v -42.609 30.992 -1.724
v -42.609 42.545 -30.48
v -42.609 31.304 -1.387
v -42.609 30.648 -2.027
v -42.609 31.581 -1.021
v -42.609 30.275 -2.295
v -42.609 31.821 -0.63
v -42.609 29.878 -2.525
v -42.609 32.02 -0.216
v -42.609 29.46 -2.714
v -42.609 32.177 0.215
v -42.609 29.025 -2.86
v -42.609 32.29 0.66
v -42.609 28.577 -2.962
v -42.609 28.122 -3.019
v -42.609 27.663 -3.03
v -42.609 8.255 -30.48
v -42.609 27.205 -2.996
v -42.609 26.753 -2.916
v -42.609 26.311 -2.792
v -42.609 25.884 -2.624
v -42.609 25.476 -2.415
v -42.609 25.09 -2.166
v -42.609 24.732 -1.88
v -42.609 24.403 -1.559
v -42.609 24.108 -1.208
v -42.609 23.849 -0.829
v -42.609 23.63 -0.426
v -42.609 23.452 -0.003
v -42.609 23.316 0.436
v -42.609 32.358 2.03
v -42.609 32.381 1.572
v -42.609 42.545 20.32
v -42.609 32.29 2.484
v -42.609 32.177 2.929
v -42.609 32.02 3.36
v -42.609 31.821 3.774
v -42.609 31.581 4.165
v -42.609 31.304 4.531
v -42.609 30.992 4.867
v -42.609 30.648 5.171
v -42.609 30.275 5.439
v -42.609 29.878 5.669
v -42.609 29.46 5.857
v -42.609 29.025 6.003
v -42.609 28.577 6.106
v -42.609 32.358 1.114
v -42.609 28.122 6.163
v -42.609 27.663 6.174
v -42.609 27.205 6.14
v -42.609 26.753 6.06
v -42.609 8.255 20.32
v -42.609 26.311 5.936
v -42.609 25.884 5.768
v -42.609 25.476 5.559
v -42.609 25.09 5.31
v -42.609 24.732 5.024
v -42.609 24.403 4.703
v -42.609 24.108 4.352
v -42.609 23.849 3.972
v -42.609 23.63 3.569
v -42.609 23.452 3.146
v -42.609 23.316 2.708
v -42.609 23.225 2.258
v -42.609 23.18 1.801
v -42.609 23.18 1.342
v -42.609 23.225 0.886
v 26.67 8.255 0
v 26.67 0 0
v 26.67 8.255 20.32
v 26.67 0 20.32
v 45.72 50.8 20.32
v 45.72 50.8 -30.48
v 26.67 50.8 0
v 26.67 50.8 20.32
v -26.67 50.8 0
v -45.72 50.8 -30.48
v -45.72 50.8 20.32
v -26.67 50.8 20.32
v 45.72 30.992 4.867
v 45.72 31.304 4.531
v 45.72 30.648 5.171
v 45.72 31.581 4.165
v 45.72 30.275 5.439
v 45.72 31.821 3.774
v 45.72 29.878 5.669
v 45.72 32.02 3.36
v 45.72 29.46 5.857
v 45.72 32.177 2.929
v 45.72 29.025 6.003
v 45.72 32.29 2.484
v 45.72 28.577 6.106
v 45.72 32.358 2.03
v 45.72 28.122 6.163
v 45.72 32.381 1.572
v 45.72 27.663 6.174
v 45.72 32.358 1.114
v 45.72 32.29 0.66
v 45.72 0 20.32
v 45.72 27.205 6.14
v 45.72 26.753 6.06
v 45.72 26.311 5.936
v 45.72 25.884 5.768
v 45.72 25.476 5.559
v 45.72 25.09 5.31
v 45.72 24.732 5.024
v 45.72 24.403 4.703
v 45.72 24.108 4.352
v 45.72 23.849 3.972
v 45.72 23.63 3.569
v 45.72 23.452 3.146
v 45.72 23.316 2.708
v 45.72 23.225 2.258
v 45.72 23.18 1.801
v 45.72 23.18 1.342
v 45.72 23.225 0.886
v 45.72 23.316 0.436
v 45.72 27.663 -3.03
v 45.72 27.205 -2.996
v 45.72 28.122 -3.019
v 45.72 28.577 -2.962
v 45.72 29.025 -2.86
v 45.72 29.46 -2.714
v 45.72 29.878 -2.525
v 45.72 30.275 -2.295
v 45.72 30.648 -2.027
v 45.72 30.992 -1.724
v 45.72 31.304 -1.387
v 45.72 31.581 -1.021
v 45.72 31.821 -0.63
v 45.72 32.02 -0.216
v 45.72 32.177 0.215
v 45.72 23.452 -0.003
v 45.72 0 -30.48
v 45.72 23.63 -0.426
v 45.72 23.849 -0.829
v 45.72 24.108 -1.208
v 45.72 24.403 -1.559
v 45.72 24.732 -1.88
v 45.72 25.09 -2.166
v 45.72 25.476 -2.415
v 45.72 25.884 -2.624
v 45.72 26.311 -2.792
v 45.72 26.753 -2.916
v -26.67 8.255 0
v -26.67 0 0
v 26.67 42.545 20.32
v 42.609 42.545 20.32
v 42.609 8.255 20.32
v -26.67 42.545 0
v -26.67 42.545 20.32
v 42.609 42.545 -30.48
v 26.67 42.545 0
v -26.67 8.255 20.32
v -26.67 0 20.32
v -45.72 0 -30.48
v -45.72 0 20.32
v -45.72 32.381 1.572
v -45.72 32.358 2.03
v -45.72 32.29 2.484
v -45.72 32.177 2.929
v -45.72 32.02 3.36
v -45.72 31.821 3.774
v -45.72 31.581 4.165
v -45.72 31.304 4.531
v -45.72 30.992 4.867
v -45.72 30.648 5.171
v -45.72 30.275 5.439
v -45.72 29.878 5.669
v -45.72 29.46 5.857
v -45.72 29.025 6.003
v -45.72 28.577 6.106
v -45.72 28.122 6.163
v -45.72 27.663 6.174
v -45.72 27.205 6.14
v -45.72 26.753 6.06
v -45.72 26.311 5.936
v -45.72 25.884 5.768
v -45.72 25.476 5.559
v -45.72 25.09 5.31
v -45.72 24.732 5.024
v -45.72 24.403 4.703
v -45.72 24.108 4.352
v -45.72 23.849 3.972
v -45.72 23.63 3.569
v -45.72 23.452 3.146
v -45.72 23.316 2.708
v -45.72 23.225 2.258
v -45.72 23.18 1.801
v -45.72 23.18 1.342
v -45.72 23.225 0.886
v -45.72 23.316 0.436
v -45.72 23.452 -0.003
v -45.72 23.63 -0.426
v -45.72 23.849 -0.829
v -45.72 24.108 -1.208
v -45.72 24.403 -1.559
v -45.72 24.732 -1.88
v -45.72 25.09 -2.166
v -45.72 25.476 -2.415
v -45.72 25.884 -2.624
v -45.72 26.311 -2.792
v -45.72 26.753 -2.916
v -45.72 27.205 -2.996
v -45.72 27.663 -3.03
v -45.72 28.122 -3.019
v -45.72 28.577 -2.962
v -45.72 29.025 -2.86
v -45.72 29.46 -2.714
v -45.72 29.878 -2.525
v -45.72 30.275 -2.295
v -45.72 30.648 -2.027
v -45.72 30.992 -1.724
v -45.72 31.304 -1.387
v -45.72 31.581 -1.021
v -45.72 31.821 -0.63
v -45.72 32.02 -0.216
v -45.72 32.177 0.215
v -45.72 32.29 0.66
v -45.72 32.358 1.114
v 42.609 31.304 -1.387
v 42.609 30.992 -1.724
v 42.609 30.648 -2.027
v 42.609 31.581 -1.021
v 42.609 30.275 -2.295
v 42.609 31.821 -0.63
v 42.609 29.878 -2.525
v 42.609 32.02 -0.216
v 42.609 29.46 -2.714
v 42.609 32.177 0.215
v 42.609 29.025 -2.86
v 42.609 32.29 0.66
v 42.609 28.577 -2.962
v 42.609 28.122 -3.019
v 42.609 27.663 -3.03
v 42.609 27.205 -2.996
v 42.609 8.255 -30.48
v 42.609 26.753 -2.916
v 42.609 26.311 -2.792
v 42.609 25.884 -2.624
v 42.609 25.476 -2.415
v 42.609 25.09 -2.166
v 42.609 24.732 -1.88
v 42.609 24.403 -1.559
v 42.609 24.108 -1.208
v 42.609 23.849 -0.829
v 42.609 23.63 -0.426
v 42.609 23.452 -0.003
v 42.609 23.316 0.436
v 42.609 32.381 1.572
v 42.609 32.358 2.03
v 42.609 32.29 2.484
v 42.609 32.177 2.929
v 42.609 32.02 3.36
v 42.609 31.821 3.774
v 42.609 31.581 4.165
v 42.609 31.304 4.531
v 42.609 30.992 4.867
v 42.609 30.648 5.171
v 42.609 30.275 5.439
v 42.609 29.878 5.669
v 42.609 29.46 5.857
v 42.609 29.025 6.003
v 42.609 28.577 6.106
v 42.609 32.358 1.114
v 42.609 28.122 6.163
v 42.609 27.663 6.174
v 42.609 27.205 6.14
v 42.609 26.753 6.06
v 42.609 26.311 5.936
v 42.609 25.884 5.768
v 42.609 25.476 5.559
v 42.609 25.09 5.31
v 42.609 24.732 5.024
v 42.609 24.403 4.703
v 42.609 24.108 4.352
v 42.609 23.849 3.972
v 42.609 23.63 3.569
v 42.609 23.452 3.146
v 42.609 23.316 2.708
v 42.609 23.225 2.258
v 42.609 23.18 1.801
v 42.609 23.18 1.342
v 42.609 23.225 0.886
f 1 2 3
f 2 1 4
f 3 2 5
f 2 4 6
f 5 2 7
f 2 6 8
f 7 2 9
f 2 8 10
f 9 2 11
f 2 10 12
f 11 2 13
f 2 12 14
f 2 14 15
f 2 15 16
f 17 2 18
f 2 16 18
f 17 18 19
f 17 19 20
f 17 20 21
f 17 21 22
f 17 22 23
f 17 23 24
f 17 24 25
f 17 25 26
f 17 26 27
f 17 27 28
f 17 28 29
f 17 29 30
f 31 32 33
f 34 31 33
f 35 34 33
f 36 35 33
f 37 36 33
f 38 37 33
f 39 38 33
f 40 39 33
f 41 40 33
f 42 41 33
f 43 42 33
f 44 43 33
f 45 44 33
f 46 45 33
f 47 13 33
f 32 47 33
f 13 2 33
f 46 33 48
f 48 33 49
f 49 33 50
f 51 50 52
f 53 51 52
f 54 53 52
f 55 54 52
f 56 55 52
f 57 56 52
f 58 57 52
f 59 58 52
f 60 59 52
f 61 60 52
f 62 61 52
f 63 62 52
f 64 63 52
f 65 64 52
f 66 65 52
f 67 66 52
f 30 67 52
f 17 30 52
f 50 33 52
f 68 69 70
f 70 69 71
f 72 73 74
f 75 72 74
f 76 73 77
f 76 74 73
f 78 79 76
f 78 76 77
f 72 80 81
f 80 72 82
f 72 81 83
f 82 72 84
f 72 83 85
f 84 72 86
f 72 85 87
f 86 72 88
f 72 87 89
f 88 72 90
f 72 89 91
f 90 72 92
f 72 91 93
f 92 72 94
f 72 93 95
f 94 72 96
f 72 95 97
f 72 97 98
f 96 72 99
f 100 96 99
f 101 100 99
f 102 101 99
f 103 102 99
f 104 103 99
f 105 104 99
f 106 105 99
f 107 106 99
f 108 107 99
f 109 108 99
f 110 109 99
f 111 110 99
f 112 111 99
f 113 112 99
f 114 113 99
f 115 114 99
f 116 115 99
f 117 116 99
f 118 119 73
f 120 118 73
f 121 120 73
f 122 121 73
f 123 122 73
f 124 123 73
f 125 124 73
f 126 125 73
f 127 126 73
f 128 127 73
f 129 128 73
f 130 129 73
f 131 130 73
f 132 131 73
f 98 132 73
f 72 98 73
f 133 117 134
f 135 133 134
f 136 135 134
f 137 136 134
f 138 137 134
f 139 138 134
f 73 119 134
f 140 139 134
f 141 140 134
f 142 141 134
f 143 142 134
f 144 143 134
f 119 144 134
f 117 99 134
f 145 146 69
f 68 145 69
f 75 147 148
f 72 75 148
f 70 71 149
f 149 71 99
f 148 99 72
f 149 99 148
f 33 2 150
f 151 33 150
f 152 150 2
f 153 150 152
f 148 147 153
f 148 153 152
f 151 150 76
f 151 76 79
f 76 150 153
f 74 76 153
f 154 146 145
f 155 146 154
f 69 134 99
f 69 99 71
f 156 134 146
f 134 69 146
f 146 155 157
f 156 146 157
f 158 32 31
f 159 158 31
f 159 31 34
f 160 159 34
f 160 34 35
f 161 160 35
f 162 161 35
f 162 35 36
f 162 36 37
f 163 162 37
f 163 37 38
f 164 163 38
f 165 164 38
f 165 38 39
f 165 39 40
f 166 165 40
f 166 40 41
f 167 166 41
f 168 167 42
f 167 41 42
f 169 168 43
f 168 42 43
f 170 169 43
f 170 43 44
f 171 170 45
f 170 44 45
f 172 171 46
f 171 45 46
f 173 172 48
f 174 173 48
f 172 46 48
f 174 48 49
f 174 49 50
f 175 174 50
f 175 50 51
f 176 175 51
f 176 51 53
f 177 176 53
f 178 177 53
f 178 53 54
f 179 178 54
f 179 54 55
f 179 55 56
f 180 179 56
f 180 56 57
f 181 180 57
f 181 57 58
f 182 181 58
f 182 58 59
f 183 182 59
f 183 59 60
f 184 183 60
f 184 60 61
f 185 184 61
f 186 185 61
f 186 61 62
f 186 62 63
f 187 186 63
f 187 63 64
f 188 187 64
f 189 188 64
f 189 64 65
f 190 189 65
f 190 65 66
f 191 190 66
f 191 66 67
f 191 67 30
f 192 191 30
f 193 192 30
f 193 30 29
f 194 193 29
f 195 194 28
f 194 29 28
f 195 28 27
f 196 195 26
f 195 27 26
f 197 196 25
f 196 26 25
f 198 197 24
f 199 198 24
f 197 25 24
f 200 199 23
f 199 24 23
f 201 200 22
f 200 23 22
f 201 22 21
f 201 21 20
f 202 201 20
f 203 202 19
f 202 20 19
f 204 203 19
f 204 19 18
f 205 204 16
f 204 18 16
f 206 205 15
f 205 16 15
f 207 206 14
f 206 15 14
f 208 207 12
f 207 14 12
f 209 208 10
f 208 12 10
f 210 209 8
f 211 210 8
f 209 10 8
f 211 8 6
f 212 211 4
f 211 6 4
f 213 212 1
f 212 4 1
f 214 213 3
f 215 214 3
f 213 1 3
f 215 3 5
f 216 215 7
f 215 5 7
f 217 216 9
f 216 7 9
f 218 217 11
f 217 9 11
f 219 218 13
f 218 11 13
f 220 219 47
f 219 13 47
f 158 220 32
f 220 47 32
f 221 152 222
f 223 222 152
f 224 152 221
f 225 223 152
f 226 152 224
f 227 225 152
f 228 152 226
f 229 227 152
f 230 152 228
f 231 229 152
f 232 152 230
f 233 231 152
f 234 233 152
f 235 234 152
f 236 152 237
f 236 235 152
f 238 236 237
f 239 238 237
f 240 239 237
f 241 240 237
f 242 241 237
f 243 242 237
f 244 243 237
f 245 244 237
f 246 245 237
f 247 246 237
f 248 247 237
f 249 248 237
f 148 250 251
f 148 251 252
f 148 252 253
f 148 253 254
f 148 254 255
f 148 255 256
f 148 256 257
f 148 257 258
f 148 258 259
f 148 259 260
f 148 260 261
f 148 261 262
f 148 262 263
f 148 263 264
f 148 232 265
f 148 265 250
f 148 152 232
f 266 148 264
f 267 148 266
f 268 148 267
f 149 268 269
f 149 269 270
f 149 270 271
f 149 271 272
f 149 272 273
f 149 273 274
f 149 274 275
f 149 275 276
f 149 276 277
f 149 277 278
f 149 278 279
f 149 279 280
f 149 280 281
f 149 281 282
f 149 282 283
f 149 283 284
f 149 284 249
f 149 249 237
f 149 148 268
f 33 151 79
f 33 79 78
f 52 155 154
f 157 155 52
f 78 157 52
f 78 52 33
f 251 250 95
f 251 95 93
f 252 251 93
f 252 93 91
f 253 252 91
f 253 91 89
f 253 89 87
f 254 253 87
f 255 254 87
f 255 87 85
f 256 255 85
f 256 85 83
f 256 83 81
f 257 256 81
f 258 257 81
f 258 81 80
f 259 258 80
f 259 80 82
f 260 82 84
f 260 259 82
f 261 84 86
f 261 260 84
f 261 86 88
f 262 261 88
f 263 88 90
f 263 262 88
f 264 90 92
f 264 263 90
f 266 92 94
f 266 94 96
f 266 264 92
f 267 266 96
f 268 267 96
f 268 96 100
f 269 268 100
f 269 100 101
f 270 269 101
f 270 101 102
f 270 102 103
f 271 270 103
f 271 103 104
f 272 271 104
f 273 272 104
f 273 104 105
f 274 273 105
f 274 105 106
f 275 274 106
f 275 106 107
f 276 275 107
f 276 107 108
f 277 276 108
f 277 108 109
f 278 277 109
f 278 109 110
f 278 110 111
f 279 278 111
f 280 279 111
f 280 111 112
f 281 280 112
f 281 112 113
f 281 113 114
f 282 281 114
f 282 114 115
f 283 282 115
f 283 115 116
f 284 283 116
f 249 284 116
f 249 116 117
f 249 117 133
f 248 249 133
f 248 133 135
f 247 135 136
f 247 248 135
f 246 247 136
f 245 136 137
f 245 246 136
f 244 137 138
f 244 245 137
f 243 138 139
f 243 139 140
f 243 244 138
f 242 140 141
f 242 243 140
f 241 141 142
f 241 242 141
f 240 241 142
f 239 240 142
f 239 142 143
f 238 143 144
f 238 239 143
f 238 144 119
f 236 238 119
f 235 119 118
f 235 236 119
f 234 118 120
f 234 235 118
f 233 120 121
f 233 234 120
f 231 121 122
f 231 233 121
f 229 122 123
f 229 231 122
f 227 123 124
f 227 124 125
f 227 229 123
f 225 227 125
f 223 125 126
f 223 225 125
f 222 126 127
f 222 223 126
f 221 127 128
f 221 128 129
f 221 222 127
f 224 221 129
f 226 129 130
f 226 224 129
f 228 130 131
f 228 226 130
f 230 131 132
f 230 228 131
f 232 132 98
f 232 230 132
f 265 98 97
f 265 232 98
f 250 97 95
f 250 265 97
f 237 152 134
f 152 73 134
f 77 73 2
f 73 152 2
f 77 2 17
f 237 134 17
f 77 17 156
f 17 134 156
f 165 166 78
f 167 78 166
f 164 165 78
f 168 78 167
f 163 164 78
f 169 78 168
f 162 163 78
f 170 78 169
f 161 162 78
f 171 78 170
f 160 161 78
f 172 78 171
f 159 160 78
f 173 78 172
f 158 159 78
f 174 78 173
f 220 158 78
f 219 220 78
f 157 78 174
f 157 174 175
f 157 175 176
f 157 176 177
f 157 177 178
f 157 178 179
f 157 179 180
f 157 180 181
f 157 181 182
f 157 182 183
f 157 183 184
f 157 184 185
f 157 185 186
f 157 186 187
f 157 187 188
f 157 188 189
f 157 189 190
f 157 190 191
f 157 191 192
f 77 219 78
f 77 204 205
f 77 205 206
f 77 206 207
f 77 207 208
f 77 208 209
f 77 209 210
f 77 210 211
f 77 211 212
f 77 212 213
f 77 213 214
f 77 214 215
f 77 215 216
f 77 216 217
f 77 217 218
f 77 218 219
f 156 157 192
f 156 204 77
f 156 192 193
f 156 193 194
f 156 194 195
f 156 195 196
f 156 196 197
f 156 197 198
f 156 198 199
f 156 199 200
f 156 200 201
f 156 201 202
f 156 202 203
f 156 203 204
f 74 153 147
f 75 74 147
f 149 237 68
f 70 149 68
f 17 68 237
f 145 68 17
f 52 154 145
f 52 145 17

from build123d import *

# Parameters (mm, degrees)
F1_DEPTH  = 50.8
F2_W      = 15.9388422537
F2_H      = 34.29
F4_DEPTH  = 25.4
F3_W      = 26.67
F3_H      = 34.29
F5_DEPTH  = 25.4
F6_DEPTH  = 25.4
F7_W      = 15.9388422537
F7_H      = 34.29
F8_DEPTH  = 5.08
F9_R      = 4.6036191434
F10_DEPTH = 25.4
F12_DEPTH = 25.4


with BuildPart() as f1:
    # F0 (on Front) → F1 (new body)
    with BuildSketch(Plane.XZ):
        Polygon((0, -30.48), (0, 0), (-26.67, 0), (-26.67, 20.32), (-45.72, 20.32), (-45.72, -30.48), align=None)
    extrude(amount=-F1_DEPTH)

    # F2 (on face) → F4 (cut)
    with BuildSketch(Plane.XY.offset(20.32)):
        with Locations((-34.6394211268, 25.4)):
            Rectangle(F2_W, F2_H)
    extrude(amount=-F4_DEPTH, mode=Mode.SUBTRACT)

    # F3 (on face) → F5 (cut)
    with BuildSketch(Plane.XY):
        with Locations((-13.335, 25.4)):
            Rectangle(F3_W, F3_H)
    extrude(amount=-F5_DEPTH, mode=Mode.SUBTRACT)

    # F6 (cut): a face of the model
    f6_faces = [f1.faces().sort_by_distance(p)[0] for p in [
        (-34.6394211268, 25.4, -5.08),
    ]]
    extrude(f6_faces, amount=-F6_DEPTH, mode=Mode.SUBTRACT)

    # F7 (on face) → F8 (join)
    with BuildSketch(Plane(origin=(0, 0, -30.48), x_dir=(1, 0, 0), z_dir=(0, 0, -1))):
        with Locations((-34.6394211268, -25.4)):
            Rectangle(F7_W, F7_H)
    extrude(amount=-F8_DEPTH)

    # F9 (on face) → F10 (cut)
    with BuildSketch(Plane.YZ.offset(-42.6088422537)):
        with Locations((27.777671814, 1.571879955)):
            Circle(F9_R)
    extrude(amount=-F10_DEPTH, mode=Mode.SUBTRACT)

    # F11: F1 across face


with BuildPart() as f1_1:
    add(f1.part)
    add(f1.part.mirror(Plane(origin=(0, 25.4, -18.5057142857), x_dir=(0, 1, 0), z_dir=(1, 0, 0))))

    # F12 (cut): a face of the model
    f12_faces = [f1_1.faces().sort_by_distance(p)[0] for p in [
        (0, 25.4, -25.4),
    ]]
    extrude(f12_faces, amount=-F12_DEPTH, mode=Mode.SUBTRACT)


solid = f1_1.part
